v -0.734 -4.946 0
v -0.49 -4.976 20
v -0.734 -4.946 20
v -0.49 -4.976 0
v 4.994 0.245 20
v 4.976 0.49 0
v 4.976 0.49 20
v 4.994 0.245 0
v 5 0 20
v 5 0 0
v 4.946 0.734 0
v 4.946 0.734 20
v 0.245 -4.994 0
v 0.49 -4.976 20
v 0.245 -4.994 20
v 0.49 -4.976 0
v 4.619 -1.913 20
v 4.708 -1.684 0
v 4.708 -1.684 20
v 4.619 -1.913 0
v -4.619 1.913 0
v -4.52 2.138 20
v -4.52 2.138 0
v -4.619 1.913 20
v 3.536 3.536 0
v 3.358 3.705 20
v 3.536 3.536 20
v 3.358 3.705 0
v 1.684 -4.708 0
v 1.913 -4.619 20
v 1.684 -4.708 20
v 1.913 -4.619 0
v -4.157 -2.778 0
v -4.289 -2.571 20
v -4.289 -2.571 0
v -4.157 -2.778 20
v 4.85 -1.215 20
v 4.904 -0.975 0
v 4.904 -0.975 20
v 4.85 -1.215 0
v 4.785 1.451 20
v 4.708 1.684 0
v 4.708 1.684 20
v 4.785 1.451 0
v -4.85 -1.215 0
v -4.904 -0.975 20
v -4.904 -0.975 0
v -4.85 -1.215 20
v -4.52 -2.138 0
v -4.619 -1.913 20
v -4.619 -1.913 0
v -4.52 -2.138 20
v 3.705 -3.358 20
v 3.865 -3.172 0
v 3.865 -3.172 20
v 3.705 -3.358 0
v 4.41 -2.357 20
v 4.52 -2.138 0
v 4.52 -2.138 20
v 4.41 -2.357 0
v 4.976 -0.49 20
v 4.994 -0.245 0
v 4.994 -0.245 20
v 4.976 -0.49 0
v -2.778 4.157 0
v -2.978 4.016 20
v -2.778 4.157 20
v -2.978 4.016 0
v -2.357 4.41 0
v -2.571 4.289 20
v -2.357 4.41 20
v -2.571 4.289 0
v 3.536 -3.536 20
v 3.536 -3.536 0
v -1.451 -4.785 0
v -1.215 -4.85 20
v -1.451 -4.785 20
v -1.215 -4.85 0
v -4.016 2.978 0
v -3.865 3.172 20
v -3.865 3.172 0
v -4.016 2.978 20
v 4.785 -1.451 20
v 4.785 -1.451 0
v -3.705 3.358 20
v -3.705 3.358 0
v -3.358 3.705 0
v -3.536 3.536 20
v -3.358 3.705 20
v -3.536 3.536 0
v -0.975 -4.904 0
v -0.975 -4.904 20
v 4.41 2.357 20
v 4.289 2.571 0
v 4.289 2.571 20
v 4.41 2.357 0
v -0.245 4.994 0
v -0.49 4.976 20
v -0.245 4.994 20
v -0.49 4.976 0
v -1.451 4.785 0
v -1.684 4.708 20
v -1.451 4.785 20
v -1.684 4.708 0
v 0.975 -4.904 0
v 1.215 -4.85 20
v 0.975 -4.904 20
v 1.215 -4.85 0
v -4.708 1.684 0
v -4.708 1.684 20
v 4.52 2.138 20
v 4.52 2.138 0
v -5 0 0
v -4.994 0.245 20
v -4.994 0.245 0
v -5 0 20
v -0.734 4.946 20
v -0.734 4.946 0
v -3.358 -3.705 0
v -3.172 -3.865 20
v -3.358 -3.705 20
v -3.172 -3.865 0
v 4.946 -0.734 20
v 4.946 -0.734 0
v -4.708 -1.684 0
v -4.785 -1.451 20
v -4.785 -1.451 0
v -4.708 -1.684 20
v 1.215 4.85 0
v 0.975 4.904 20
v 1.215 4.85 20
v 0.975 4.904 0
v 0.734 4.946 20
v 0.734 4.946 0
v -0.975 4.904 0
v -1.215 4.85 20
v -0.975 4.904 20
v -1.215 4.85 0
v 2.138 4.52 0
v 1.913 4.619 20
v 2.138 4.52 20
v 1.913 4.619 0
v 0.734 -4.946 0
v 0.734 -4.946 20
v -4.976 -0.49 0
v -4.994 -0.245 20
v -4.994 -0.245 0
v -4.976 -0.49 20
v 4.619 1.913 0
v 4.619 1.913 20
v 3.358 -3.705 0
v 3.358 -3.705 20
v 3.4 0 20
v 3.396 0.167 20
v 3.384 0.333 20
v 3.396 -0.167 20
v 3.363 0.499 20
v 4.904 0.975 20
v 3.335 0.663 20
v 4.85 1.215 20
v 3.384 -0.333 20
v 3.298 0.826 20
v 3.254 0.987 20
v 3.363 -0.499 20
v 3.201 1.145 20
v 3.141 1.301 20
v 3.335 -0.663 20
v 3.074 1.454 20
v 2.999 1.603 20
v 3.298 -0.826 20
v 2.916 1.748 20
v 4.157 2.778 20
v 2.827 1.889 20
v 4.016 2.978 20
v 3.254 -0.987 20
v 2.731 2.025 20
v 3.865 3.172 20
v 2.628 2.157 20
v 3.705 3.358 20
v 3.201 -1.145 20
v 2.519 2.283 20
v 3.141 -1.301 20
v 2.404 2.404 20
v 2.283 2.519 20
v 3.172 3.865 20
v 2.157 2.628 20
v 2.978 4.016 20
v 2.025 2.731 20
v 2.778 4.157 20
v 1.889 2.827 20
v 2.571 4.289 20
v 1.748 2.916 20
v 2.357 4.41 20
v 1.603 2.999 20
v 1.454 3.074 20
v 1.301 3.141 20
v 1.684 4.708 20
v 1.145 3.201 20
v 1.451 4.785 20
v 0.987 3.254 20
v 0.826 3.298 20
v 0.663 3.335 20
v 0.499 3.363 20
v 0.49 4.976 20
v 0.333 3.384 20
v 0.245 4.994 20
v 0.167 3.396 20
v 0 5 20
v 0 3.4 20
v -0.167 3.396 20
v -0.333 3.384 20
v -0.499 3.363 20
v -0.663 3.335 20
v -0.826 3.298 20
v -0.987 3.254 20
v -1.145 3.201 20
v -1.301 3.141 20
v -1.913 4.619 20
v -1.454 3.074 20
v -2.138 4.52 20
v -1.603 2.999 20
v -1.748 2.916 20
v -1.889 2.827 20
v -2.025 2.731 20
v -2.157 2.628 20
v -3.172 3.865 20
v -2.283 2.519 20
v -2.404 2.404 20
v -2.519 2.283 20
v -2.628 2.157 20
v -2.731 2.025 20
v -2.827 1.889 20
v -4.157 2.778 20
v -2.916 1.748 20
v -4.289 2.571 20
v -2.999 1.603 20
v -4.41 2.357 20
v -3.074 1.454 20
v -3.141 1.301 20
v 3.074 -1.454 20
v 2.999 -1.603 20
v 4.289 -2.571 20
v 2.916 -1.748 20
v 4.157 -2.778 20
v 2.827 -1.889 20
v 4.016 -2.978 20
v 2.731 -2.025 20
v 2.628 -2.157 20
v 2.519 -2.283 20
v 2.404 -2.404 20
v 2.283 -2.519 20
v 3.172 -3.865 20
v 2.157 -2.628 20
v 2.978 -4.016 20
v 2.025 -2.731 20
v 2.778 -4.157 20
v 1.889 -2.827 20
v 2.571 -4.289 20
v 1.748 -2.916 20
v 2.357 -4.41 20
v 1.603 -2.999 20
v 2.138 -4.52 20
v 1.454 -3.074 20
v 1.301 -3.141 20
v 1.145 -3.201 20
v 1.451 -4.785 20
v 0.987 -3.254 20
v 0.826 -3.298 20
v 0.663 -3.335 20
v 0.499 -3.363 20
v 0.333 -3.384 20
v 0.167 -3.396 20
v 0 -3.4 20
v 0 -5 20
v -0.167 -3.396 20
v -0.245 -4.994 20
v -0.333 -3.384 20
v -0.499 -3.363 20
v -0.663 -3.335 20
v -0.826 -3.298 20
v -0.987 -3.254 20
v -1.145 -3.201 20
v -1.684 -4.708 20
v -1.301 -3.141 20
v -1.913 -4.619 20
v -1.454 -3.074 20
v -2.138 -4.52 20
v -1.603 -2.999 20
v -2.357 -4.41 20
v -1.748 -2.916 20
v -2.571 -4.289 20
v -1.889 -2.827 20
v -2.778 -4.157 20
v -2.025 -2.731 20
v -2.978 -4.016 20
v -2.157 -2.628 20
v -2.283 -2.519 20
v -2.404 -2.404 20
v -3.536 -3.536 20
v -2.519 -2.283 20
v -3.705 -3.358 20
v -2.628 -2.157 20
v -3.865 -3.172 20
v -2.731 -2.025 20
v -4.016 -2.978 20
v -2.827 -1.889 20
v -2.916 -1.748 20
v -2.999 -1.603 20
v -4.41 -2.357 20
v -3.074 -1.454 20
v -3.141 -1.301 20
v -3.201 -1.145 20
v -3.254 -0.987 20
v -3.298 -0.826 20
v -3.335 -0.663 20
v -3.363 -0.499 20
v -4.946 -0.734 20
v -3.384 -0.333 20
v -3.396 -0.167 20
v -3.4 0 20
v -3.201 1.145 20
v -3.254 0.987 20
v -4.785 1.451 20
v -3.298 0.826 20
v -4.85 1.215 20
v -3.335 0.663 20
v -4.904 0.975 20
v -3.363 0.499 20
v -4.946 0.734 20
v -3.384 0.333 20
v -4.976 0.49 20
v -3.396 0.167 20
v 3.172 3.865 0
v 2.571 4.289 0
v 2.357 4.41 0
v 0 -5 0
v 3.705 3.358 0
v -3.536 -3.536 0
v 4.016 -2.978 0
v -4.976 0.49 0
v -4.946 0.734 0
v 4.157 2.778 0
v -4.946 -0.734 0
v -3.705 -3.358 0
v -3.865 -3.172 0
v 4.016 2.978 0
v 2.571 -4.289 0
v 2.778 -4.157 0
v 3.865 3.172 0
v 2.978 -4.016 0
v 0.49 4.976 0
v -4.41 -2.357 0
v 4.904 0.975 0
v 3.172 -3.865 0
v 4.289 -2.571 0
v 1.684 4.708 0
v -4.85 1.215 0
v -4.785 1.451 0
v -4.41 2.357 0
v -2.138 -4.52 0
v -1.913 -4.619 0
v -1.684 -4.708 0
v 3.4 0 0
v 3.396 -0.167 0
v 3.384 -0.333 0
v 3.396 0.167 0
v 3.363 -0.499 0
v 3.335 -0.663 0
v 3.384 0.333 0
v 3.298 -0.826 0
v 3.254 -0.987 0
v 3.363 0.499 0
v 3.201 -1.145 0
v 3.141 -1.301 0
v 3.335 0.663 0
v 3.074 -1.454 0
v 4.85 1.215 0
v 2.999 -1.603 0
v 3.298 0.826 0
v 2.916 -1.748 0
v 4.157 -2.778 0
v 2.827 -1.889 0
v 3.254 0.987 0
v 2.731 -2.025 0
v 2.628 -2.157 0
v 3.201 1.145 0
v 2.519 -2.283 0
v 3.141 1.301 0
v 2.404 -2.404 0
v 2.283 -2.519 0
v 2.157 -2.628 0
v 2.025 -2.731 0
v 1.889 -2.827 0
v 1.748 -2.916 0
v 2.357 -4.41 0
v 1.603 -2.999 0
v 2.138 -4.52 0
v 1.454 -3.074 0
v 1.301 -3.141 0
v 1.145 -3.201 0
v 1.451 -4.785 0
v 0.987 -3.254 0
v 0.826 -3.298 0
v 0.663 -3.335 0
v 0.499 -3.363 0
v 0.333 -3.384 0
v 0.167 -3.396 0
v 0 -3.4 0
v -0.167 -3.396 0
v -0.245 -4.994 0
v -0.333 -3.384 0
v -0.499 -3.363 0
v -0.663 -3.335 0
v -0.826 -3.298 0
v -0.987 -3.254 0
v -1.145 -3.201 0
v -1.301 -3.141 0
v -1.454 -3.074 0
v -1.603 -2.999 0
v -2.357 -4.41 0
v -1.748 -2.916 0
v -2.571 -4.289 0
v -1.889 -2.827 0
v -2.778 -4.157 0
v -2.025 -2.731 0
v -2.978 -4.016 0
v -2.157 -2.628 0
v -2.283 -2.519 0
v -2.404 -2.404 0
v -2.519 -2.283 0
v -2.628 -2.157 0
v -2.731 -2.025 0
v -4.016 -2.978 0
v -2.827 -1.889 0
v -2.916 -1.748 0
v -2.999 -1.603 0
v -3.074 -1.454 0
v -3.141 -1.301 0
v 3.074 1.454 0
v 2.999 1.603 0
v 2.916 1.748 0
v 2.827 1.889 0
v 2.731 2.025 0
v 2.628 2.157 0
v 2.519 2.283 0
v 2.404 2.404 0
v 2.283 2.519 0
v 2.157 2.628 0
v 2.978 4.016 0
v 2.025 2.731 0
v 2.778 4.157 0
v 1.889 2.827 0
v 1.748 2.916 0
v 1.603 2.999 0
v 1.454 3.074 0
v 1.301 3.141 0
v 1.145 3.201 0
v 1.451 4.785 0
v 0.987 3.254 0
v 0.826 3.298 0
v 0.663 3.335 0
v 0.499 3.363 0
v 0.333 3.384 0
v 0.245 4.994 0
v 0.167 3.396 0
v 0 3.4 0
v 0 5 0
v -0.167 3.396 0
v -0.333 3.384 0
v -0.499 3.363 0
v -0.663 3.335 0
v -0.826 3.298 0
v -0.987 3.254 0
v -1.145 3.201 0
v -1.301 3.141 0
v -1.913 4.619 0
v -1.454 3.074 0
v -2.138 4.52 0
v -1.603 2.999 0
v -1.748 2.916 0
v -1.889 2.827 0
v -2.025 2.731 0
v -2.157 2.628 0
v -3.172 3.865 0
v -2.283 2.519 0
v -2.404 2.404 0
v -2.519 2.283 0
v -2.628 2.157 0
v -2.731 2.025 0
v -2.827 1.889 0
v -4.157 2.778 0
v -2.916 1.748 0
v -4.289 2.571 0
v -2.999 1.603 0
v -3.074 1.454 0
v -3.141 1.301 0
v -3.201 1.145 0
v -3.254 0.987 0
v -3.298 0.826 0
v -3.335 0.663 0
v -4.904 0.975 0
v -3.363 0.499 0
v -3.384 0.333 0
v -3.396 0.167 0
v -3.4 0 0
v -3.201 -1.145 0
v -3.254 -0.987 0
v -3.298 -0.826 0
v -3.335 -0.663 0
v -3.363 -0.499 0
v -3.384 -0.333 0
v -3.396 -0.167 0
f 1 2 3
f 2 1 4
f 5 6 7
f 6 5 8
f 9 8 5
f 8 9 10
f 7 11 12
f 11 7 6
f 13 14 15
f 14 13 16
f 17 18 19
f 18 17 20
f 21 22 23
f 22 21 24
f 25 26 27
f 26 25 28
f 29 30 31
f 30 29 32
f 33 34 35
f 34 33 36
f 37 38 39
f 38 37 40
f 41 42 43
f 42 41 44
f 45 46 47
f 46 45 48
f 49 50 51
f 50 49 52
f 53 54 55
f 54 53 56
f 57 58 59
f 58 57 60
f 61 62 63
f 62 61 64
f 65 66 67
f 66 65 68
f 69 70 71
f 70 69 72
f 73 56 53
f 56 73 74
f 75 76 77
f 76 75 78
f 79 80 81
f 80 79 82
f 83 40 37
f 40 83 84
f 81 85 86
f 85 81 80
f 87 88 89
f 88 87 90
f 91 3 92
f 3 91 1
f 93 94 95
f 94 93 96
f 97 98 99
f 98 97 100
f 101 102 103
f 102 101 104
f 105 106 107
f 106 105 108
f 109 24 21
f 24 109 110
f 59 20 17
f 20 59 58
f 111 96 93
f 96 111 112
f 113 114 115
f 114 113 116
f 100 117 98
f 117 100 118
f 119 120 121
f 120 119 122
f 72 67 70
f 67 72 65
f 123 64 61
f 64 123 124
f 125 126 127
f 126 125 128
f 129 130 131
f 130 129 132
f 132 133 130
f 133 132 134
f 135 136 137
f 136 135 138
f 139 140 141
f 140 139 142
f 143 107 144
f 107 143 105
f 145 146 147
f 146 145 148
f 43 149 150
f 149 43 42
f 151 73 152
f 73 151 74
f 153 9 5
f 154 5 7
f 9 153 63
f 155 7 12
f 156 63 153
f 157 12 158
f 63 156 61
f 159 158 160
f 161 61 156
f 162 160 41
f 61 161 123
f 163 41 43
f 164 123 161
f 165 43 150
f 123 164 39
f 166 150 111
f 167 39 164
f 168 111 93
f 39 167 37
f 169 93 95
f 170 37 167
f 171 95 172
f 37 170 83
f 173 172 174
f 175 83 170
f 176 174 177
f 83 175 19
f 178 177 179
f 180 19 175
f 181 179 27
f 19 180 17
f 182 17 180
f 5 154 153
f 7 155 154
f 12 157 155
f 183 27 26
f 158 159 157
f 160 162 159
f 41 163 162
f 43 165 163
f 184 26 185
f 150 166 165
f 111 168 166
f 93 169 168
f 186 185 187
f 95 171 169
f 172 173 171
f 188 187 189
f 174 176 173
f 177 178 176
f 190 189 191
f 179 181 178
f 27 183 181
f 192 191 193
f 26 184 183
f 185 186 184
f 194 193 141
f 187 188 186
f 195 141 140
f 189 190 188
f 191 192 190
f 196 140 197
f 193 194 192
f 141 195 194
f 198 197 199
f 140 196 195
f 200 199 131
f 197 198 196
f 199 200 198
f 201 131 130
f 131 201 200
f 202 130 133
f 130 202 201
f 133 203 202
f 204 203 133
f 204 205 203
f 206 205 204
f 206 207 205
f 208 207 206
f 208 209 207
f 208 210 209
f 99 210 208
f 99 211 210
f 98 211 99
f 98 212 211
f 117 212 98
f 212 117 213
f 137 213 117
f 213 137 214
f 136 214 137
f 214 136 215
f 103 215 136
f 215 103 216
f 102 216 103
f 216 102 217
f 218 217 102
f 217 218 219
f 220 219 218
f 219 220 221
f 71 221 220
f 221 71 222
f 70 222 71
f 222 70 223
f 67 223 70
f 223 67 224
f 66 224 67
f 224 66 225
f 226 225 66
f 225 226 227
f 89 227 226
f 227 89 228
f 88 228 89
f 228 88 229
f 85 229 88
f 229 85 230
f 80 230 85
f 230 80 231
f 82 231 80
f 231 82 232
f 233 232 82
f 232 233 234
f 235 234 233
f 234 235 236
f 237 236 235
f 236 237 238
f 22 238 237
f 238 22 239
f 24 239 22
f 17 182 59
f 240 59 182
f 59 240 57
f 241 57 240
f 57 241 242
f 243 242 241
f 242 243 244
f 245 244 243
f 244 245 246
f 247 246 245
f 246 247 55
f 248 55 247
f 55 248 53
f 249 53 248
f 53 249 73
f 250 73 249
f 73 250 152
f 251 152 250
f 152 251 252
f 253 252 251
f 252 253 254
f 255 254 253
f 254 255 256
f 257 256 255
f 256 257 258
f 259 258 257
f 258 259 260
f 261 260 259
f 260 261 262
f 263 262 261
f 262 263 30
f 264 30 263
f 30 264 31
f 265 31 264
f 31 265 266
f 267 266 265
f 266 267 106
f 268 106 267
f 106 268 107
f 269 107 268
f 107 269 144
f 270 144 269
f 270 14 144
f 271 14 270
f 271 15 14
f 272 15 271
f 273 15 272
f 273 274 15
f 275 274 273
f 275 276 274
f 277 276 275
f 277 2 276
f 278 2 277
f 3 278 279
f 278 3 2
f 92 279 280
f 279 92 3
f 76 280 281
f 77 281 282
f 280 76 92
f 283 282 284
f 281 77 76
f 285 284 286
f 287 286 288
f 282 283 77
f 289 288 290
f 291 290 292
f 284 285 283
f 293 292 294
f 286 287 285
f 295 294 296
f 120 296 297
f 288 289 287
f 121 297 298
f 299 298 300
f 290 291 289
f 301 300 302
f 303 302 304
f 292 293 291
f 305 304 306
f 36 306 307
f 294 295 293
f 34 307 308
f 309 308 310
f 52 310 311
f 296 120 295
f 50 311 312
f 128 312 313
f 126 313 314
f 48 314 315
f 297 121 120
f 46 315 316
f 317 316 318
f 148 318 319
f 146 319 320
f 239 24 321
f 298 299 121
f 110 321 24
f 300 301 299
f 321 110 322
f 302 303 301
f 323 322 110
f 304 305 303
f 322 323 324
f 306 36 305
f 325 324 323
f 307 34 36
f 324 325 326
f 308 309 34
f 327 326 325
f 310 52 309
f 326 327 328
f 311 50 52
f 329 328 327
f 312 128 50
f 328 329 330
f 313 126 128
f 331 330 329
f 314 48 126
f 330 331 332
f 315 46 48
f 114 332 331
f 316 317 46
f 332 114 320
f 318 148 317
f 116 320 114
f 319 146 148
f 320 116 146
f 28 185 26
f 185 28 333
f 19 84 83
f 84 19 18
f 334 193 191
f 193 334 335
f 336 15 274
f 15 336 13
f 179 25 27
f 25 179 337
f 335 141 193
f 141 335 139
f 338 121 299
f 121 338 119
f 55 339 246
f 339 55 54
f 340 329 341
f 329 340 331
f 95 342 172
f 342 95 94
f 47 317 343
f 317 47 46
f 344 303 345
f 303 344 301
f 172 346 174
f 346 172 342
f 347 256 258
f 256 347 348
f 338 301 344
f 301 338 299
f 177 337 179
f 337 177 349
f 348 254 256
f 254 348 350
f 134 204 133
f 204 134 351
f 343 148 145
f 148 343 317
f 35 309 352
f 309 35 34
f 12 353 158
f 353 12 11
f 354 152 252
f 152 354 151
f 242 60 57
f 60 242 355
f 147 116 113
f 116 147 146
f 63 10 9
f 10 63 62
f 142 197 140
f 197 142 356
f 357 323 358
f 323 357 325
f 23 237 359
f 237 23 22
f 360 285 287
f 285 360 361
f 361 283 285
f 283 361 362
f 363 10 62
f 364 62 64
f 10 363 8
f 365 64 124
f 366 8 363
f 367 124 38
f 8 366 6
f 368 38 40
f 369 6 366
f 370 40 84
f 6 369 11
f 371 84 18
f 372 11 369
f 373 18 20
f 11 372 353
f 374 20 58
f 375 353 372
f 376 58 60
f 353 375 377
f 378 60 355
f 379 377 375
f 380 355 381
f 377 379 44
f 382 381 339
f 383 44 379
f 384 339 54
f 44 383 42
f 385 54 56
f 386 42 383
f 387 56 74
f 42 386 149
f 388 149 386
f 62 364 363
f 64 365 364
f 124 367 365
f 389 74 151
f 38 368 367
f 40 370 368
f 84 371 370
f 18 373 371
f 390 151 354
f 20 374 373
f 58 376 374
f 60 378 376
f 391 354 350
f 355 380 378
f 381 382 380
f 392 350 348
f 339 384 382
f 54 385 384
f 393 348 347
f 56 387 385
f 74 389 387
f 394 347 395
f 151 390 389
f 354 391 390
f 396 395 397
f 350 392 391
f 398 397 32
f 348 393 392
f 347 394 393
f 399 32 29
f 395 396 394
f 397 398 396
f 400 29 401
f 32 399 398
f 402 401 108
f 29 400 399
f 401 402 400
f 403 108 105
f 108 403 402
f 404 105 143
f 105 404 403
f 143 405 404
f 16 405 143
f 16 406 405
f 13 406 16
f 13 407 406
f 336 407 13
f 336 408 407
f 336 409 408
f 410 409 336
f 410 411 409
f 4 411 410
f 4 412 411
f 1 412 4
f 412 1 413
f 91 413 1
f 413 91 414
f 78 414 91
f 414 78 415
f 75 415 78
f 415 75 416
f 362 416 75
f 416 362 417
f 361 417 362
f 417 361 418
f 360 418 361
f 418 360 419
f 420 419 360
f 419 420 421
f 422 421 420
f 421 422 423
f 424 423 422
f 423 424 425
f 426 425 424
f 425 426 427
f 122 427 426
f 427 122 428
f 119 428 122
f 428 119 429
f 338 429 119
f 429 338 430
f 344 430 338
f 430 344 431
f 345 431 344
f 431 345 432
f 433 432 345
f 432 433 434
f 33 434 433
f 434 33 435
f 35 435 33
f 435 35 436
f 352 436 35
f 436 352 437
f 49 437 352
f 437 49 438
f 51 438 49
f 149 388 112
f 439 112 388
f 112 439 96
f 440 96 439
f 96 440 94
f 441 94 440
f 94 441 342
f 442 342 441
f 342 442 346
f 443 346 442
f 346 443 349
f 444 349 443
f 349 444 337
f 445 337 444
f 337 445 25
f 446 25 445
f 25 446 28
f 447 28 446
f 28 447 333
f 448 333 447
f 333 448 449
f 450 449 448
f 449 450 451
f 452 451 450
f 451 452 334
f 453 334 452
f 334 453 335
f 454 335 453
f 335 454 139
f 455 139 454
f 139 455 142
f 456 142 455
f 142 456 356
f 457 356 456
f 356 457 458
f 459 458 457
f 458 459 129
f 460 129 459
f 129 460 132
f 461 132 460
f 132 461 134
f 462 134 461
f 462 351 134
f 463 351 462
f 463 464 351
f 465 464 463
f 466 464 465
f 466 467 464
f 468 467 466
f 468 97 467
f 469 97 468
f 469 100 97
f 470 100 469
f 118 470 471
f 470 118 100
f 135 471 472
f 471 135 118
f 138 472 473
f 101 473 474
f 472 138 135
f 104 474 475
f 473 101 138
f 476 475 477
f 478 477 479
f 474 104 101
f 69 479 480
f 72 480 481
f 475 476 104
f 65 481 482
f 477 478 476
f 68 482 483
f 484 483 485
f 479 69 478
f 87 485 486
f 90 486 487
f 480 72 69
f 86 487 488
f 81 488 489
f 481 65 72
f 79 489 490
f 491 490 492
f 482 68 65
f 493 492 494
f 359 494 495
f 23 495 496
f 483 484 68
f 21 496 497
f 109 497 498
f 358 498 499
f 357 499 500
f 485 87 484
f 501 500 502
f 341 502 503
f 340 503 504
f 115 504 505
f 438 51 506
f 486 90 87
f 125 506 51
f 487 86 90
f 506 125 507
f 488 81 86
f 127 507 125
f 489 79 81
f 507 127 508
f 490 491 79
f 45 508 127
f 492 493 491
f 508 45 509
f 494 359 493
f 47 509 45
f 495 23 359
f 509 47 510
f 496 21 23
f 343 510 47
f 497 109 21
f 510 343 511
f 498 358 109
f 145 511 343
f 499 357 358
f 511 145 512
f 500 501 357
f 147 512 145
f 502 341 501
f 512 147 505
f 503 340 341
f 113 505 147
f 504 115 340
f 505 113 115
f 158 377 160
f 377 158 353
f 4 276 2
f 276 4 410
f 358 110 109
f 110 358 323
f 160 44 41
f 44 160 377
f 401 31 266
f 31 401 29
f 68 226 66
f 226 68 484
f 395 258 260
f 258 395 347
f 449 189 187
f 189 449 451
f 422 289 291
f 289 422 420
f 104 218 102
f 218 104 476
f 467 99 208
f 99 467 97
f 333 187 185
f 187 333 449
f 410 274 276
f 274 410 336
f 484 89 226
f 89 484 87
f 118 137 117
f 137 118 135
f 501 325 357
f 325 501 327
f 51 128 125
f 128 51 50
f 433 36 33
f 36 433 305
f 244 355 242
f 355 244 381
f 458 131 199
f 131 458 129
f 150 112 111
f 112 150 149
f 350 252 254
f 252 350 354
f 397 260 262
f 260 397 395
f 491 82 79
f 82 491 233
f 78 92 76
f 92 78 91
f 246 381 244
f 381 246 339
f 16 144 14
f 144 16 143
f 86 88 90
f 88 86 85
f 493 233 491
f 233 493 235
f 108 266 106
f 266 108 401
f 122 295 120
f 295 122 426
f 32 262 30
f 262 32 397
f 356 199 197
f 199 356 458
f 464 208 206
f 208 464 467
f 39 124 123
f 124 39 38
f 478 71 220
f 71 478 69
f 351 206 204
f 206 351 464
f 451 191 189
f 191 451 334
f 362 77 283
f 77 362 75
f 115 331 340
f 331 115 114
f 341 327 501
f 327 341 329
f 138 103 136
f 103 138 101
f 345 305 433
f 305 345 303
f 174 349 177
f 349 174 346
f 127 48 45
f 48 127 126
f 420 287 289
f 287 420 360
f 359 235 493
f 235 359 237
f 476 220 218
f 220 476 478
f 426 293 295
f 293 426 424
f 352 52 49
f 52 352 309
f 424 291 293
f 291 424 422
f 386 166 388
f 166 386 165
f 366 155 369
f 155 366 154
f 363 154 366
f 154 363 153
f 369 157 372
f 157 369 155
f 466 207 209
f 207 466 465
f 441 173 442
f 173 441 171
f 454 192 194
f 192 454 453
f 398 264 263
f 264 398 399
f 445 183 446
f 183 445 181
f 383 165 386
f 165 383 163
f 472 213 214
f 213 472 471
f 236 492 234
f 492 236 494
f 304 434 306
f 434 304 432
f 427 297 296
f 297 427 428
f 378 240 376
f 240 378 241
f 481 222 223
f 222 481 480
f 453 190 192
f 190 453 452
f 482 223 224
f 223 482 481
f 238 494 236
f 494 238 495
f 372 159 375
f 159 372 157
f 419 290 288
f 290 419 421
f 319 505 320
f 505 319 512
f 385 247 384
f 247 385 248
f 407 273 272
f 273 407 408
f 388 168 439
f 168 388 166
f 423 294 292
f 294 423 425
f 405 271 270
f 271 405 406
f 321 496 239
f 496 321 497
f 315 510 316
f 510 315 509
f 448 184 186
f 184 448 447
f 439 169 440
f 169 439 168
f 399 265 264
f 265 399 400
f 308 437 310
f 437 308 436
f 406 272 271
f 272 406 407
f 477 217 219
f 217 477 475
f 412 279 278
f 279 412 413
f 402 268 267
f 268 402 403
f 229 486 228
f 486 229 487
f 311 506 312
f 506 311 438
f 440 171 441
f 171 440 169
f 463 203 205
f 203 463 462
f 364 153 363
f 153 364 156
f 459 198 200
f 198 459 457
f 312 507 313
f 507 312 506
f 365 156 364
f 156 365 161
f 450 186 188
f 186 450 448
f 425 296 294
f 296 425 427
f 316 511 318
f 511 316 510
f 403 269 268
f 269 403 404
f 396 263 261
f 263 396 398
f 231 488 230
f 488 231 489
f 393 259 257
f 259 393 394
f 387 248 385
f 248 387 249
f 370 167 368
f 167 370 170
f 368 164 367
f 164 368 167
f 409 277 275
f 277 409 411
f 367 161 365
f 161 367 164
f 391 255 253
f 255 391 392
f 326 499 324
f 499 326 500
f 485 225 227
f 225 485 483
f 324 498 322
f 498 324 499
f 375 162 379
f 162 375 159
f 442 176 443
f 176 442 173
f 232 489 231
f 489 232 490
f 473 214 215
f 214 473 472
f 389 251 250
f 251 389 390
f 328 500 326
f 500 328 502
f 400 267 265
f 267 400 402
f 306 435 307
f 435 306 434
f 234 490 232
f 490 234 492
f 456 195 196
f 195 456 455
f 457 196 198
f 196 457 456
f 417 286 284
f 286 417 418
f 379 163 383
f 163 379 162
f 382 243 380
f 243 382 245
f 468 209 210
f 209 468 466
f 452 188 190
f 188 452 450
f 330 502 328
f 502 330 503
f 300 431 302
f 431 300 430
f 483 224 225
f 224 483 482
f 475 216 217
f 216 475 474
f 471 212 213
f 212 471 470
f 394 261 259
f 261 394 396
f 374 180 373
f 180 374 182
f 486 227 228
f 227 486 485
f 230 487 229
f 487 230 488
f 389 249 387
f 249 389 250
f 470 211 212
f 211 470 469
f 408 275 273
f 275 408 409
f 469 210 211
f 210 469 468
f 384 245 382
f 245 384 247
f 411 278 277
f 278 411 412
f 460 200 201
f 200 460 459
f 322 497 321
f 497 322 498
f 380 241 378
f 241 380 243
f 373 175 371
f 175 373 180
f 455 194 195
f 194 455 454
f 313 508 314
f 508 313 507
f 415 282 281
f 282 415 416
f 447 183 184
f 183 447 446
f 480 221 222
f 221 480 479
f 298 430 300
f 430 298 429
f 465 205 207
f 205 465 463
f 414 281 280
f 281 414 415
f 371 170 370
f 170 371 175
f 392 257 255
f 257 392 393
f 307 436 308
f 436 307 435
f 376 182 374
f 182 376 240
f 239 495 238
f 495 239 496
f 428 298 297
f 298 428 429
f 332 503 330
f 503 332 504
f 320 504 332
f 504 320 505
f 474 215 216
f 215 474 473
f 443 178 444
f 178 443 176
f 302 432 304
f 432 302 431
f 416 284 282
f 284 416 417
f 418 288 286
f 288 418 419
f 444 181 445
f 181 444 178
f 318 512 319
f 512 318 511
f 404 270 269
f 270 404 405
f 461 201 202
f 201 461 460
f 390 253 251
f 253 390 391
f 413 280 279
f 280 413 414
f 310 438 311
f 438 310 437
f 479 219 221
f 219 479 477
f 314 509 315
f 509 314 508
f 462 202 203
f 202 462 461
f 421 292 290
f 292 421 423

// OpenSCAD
// Lab funnel - printed upright, open at top and bottom
// Units: mm

// ---- Parameters ----
spout_od      = 10;    // spout outer diameter
spout_h       = 20;    // spout height (z = 0 to 20)
cone_od_top   = 60;    // cone rim outer diameter (z = 50)
cone_h        = 30;    // cone height (z = 20 to 50)
wall          = 1.6;   // wall thickness everywhere
eps           = 0.5;   // cutter overshoot past faces

$fn = 128;

// ---- Derived ----
spout_id = spout_od - 2 * wall;   // bore diameter
cone_id_top = cone_od_top - 2 * wall;  // cone inner diameter at rim

// ---- Model ----
difference() {
    union() {
        // Spout (tube)
        cylinder(d = spout_od, h = spout_h);
        // Cone - thick-walled, built as a frustum
        translate([0, 0, spout_h])
            rotate_extrude()
                polygon(points = [
                    [cone_id_top / 2, spout_h + cone_h],
                    [cone_od_top / 2, spout_h + cone_h],
                    [cone_od_top / 2, spout_h],
                    [cone_id_top / 2, spout_h]
                ]);
    }
    // Through-bore: spout bore up to cone start, then cone bore to rim
    translate([0, 0, spout_h])
        rotate_extrude()
            polygon(points = [
                [cone_id_top / 2, spout_h + cone_h],
                [cone_od_top / 2, spout_h + cone_h],
                [cone_od_top / 2, spout_h],
                [cone_id_top / 2, spout_h]
            ]);
    // Cap below spout start so the bore is clean through
    translate([0, 0, -eps])
        cylinder(d = spout_id, h = spout_h + 2 * eps);
}
